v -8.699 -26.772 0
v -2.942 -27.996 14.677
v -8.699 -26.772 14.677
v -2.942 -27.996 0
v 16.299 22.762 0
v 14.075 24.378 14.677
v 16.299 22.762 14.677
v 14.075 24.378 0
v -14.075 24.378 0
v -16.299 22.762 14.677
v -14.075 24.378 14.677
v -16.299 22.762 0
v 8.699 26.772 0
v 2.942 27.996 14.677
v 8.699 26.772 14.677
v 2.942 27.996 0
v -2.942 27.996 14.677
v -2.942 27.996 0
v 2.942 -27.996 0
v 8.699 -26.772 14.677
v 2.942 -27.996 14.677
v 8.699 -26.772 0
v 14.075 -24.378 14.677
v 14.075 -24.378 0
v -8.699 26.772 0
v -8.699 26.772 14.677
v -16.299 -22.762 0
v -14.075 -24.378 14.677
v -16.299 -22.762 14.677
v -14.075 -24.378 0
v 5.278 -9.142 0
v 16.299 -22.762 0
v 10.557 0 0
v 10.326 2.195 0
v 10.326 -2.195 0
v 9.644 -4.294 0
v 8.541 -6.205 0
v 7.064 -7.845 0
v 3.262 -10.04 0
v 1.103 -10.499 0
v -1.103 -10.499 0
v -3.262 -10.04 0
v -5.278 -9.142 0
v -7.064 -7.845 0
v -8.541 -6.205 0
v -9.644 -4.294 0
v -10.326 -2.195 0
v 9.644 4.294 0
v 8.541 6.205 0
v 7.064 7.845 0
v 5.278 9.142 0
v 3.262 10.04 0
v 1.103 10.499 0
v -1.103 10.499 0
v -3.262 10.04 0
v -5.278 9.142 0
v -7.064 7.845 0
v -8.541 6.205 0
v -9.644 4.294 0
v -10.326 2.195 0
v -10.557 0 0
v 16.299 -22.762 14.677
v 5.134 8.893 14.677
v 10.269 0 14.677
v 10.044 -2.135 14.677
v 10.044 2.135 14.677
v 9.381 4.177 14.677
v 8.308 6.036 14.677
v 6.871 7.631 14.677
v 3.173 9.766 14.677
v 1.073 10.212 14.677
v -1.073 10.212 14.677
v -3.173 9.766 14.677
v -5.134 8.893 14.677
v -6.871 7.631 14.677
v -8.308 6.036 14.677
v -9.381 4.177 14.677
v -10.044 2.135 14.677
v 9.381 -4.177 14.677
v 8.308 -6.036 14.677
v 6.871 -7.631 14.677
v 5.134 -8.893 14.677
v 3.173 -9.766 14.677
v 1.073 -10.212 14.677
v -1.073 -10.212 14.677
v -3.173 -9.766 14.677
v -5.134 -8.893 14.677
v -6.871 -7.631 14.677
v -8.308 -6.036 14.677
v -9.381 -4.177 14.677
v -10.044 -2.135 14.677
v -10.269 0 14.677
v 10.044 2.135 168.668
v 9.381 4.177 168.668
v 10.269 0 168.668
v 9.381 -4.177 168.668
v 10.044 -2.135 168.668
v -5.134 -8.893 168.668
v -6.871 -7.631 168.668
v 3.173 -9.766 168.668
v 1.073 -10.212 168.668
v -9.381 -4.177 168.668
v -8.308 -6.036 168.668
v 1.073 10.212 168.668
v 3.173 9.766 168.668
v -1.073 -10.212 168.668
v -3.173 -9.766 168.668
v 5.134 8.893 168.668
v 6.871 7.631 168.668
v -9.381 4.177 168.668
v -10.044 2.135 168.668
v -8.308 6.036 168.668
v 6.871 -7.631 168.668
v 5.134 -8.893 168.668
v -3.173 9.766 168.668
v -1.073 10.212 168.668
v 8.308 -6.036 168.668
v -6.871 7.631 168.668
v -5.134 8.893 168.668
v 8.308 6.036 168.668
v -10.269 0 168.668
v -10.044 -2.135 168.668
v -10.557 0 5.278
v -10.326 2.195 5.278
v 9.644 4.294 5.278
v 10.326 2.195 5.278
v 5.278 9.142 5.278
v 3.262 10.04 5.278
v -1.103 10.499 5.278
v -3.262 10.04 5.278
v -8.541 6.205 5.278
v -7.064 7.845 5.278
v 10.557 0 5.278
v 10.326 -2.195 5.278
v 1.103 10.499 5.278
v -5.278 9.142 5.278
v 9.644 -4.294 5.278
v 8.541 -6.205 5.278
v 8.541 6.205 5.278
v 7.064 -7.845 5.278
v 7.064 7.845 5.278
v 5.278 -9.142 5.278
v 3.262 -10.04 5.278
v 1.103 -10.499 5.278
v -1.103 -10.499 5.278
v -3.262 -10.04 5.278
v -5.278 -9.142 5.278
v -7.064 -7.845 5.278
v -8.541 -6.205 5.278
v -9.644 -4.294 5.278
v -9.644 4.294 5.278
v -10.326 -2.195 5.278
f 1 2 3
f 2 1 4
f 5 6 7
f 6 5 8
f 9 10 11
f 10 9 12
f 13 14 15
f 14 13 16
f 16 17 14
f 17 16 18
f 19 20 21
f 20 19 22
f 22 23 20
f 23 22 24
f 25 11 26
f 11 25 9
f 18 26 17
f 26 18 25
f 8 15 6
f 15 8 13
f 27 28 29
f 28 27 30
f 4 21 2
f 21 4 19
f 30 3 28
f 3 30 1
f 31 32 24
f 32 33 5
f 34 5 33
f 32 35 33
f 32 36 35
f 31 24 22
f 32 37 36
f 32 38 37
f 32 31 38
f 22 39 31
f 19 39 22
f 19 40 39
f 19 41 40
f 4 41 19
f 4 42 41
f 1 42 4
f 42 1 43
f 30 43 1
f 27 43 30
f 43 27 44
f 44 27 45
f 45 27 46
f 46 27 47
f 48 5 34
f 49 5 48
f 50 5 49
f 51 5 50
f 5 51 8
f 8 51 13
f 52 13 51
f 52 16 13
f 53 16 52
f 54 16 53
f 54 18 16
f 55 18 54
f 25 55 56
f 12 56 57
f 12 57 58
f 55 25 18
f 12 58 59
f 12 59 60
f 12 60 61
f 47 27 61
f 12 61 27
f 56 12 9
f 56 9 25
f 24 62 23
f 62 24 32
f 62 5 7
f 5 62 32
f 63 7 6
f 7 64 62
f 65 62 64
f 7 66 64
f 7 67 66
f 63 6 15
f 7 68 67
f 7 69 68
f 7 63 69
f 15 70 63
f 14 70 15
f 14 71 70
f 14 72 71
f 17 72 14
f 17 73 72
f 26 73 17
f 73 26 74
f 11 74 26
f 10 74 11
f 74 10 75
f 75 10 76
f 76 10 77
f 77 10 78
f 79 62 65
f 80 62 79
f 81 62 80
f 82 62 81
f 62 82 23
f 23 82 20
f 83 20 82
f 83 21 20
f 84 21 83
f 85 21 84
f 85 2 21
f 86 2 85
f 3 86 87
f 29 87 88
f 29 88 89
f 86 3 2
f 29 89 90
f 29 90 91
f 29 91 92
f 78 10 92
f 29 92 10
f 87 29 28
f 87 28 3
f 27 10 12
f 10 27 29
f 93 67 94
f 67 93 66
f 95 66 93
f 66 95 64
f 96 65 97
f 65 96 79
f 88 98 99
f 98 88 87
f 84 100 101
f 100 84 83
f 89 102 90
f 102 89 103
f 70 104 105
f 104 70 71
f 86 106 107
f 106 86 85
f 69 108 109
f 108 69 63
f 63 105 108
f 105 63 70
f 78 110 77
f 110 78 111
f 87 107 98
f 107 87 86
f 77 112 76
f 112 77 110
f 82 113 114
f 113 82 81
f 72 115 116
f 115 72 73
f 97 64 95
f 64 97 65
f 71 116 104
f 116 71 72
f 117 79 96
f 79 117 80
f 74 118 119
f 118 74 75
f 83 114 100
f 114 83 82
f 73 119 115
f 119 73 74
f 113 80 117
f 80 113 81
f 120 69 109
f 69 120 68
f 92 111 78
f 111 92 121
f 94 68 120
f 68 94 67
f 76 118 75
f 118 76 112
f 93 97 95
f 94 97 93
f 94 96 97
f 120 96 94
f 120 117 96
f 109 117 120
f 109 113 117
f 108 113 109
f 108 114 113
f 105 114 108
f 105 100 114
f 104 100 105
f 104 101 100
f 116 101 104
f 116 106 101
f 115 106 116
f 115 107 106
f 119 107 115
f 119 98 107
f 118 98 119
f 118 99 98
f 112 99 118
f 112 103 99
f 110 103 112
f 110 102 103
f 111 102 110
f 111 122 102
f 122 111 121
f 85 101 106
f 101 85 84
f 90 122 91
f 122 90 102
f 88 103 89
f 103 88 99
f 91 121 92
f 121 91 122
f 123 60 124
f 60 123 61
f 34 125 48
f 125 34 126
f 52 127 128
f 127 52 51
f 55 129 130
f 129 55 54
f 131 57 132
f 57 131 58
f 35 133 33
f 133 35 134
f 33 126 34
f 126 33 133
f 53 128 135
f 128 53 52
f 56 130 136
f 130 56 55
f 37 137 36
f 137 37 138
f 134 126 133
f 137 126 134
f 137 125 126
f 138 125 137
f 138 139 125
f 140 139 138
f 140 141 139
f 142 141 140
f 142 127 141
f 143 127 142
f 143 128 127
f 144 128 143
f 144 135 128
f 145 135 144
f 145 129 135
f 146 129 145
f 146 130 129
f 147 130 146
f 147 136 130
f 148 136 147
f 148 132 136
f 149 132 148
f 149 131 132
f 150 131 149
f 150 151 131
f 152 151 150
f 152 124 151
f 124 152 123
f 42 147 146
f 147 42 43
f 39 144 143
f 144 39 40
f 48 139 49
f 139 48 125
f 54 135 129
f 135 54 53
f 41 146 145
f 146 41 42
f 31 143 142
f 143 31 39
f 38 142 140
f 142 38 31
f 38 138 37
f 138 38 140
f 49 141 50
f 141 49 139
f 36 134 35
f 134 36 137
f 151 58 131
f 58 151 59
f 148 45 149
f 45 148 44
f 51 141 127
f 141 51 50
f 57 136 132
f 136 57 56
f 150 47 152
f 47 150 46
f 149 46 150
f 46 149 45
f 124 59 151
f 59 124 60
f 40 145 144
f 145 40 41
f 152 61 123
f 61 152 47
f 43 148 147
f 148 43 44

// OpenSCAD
seed = 17;
seeds = rands(0,1000000,10,seed);
head_size = rands(25,50,1,seeds[1])[0];
head_radius = rands(25,50,1,seeds[2])[0];
bolt_length = rands(head_size*2,200,1,seeds[3])[0];
bolt_radius = rands(head_size/3, head_size/2,1,seeds[0])[0];
cube_size = rands(bolt_radius*2, head_radius*1.6,1, seeds[4])[0];
hole_size = rands(cube_size/4, cube_size/3,1,seeds[5])[0];


difference(){
    union(){
        intersection(){
            cylinder(head_size,head_radius,head_radius);
            cube([cube_size,head_radius*2,head_size], center=true);
        }
        cylinder(bolt_length,bolt_radius,bolt_radius);
    }
    cylinder(hole_size,hole_size,hole_size, true);
}
